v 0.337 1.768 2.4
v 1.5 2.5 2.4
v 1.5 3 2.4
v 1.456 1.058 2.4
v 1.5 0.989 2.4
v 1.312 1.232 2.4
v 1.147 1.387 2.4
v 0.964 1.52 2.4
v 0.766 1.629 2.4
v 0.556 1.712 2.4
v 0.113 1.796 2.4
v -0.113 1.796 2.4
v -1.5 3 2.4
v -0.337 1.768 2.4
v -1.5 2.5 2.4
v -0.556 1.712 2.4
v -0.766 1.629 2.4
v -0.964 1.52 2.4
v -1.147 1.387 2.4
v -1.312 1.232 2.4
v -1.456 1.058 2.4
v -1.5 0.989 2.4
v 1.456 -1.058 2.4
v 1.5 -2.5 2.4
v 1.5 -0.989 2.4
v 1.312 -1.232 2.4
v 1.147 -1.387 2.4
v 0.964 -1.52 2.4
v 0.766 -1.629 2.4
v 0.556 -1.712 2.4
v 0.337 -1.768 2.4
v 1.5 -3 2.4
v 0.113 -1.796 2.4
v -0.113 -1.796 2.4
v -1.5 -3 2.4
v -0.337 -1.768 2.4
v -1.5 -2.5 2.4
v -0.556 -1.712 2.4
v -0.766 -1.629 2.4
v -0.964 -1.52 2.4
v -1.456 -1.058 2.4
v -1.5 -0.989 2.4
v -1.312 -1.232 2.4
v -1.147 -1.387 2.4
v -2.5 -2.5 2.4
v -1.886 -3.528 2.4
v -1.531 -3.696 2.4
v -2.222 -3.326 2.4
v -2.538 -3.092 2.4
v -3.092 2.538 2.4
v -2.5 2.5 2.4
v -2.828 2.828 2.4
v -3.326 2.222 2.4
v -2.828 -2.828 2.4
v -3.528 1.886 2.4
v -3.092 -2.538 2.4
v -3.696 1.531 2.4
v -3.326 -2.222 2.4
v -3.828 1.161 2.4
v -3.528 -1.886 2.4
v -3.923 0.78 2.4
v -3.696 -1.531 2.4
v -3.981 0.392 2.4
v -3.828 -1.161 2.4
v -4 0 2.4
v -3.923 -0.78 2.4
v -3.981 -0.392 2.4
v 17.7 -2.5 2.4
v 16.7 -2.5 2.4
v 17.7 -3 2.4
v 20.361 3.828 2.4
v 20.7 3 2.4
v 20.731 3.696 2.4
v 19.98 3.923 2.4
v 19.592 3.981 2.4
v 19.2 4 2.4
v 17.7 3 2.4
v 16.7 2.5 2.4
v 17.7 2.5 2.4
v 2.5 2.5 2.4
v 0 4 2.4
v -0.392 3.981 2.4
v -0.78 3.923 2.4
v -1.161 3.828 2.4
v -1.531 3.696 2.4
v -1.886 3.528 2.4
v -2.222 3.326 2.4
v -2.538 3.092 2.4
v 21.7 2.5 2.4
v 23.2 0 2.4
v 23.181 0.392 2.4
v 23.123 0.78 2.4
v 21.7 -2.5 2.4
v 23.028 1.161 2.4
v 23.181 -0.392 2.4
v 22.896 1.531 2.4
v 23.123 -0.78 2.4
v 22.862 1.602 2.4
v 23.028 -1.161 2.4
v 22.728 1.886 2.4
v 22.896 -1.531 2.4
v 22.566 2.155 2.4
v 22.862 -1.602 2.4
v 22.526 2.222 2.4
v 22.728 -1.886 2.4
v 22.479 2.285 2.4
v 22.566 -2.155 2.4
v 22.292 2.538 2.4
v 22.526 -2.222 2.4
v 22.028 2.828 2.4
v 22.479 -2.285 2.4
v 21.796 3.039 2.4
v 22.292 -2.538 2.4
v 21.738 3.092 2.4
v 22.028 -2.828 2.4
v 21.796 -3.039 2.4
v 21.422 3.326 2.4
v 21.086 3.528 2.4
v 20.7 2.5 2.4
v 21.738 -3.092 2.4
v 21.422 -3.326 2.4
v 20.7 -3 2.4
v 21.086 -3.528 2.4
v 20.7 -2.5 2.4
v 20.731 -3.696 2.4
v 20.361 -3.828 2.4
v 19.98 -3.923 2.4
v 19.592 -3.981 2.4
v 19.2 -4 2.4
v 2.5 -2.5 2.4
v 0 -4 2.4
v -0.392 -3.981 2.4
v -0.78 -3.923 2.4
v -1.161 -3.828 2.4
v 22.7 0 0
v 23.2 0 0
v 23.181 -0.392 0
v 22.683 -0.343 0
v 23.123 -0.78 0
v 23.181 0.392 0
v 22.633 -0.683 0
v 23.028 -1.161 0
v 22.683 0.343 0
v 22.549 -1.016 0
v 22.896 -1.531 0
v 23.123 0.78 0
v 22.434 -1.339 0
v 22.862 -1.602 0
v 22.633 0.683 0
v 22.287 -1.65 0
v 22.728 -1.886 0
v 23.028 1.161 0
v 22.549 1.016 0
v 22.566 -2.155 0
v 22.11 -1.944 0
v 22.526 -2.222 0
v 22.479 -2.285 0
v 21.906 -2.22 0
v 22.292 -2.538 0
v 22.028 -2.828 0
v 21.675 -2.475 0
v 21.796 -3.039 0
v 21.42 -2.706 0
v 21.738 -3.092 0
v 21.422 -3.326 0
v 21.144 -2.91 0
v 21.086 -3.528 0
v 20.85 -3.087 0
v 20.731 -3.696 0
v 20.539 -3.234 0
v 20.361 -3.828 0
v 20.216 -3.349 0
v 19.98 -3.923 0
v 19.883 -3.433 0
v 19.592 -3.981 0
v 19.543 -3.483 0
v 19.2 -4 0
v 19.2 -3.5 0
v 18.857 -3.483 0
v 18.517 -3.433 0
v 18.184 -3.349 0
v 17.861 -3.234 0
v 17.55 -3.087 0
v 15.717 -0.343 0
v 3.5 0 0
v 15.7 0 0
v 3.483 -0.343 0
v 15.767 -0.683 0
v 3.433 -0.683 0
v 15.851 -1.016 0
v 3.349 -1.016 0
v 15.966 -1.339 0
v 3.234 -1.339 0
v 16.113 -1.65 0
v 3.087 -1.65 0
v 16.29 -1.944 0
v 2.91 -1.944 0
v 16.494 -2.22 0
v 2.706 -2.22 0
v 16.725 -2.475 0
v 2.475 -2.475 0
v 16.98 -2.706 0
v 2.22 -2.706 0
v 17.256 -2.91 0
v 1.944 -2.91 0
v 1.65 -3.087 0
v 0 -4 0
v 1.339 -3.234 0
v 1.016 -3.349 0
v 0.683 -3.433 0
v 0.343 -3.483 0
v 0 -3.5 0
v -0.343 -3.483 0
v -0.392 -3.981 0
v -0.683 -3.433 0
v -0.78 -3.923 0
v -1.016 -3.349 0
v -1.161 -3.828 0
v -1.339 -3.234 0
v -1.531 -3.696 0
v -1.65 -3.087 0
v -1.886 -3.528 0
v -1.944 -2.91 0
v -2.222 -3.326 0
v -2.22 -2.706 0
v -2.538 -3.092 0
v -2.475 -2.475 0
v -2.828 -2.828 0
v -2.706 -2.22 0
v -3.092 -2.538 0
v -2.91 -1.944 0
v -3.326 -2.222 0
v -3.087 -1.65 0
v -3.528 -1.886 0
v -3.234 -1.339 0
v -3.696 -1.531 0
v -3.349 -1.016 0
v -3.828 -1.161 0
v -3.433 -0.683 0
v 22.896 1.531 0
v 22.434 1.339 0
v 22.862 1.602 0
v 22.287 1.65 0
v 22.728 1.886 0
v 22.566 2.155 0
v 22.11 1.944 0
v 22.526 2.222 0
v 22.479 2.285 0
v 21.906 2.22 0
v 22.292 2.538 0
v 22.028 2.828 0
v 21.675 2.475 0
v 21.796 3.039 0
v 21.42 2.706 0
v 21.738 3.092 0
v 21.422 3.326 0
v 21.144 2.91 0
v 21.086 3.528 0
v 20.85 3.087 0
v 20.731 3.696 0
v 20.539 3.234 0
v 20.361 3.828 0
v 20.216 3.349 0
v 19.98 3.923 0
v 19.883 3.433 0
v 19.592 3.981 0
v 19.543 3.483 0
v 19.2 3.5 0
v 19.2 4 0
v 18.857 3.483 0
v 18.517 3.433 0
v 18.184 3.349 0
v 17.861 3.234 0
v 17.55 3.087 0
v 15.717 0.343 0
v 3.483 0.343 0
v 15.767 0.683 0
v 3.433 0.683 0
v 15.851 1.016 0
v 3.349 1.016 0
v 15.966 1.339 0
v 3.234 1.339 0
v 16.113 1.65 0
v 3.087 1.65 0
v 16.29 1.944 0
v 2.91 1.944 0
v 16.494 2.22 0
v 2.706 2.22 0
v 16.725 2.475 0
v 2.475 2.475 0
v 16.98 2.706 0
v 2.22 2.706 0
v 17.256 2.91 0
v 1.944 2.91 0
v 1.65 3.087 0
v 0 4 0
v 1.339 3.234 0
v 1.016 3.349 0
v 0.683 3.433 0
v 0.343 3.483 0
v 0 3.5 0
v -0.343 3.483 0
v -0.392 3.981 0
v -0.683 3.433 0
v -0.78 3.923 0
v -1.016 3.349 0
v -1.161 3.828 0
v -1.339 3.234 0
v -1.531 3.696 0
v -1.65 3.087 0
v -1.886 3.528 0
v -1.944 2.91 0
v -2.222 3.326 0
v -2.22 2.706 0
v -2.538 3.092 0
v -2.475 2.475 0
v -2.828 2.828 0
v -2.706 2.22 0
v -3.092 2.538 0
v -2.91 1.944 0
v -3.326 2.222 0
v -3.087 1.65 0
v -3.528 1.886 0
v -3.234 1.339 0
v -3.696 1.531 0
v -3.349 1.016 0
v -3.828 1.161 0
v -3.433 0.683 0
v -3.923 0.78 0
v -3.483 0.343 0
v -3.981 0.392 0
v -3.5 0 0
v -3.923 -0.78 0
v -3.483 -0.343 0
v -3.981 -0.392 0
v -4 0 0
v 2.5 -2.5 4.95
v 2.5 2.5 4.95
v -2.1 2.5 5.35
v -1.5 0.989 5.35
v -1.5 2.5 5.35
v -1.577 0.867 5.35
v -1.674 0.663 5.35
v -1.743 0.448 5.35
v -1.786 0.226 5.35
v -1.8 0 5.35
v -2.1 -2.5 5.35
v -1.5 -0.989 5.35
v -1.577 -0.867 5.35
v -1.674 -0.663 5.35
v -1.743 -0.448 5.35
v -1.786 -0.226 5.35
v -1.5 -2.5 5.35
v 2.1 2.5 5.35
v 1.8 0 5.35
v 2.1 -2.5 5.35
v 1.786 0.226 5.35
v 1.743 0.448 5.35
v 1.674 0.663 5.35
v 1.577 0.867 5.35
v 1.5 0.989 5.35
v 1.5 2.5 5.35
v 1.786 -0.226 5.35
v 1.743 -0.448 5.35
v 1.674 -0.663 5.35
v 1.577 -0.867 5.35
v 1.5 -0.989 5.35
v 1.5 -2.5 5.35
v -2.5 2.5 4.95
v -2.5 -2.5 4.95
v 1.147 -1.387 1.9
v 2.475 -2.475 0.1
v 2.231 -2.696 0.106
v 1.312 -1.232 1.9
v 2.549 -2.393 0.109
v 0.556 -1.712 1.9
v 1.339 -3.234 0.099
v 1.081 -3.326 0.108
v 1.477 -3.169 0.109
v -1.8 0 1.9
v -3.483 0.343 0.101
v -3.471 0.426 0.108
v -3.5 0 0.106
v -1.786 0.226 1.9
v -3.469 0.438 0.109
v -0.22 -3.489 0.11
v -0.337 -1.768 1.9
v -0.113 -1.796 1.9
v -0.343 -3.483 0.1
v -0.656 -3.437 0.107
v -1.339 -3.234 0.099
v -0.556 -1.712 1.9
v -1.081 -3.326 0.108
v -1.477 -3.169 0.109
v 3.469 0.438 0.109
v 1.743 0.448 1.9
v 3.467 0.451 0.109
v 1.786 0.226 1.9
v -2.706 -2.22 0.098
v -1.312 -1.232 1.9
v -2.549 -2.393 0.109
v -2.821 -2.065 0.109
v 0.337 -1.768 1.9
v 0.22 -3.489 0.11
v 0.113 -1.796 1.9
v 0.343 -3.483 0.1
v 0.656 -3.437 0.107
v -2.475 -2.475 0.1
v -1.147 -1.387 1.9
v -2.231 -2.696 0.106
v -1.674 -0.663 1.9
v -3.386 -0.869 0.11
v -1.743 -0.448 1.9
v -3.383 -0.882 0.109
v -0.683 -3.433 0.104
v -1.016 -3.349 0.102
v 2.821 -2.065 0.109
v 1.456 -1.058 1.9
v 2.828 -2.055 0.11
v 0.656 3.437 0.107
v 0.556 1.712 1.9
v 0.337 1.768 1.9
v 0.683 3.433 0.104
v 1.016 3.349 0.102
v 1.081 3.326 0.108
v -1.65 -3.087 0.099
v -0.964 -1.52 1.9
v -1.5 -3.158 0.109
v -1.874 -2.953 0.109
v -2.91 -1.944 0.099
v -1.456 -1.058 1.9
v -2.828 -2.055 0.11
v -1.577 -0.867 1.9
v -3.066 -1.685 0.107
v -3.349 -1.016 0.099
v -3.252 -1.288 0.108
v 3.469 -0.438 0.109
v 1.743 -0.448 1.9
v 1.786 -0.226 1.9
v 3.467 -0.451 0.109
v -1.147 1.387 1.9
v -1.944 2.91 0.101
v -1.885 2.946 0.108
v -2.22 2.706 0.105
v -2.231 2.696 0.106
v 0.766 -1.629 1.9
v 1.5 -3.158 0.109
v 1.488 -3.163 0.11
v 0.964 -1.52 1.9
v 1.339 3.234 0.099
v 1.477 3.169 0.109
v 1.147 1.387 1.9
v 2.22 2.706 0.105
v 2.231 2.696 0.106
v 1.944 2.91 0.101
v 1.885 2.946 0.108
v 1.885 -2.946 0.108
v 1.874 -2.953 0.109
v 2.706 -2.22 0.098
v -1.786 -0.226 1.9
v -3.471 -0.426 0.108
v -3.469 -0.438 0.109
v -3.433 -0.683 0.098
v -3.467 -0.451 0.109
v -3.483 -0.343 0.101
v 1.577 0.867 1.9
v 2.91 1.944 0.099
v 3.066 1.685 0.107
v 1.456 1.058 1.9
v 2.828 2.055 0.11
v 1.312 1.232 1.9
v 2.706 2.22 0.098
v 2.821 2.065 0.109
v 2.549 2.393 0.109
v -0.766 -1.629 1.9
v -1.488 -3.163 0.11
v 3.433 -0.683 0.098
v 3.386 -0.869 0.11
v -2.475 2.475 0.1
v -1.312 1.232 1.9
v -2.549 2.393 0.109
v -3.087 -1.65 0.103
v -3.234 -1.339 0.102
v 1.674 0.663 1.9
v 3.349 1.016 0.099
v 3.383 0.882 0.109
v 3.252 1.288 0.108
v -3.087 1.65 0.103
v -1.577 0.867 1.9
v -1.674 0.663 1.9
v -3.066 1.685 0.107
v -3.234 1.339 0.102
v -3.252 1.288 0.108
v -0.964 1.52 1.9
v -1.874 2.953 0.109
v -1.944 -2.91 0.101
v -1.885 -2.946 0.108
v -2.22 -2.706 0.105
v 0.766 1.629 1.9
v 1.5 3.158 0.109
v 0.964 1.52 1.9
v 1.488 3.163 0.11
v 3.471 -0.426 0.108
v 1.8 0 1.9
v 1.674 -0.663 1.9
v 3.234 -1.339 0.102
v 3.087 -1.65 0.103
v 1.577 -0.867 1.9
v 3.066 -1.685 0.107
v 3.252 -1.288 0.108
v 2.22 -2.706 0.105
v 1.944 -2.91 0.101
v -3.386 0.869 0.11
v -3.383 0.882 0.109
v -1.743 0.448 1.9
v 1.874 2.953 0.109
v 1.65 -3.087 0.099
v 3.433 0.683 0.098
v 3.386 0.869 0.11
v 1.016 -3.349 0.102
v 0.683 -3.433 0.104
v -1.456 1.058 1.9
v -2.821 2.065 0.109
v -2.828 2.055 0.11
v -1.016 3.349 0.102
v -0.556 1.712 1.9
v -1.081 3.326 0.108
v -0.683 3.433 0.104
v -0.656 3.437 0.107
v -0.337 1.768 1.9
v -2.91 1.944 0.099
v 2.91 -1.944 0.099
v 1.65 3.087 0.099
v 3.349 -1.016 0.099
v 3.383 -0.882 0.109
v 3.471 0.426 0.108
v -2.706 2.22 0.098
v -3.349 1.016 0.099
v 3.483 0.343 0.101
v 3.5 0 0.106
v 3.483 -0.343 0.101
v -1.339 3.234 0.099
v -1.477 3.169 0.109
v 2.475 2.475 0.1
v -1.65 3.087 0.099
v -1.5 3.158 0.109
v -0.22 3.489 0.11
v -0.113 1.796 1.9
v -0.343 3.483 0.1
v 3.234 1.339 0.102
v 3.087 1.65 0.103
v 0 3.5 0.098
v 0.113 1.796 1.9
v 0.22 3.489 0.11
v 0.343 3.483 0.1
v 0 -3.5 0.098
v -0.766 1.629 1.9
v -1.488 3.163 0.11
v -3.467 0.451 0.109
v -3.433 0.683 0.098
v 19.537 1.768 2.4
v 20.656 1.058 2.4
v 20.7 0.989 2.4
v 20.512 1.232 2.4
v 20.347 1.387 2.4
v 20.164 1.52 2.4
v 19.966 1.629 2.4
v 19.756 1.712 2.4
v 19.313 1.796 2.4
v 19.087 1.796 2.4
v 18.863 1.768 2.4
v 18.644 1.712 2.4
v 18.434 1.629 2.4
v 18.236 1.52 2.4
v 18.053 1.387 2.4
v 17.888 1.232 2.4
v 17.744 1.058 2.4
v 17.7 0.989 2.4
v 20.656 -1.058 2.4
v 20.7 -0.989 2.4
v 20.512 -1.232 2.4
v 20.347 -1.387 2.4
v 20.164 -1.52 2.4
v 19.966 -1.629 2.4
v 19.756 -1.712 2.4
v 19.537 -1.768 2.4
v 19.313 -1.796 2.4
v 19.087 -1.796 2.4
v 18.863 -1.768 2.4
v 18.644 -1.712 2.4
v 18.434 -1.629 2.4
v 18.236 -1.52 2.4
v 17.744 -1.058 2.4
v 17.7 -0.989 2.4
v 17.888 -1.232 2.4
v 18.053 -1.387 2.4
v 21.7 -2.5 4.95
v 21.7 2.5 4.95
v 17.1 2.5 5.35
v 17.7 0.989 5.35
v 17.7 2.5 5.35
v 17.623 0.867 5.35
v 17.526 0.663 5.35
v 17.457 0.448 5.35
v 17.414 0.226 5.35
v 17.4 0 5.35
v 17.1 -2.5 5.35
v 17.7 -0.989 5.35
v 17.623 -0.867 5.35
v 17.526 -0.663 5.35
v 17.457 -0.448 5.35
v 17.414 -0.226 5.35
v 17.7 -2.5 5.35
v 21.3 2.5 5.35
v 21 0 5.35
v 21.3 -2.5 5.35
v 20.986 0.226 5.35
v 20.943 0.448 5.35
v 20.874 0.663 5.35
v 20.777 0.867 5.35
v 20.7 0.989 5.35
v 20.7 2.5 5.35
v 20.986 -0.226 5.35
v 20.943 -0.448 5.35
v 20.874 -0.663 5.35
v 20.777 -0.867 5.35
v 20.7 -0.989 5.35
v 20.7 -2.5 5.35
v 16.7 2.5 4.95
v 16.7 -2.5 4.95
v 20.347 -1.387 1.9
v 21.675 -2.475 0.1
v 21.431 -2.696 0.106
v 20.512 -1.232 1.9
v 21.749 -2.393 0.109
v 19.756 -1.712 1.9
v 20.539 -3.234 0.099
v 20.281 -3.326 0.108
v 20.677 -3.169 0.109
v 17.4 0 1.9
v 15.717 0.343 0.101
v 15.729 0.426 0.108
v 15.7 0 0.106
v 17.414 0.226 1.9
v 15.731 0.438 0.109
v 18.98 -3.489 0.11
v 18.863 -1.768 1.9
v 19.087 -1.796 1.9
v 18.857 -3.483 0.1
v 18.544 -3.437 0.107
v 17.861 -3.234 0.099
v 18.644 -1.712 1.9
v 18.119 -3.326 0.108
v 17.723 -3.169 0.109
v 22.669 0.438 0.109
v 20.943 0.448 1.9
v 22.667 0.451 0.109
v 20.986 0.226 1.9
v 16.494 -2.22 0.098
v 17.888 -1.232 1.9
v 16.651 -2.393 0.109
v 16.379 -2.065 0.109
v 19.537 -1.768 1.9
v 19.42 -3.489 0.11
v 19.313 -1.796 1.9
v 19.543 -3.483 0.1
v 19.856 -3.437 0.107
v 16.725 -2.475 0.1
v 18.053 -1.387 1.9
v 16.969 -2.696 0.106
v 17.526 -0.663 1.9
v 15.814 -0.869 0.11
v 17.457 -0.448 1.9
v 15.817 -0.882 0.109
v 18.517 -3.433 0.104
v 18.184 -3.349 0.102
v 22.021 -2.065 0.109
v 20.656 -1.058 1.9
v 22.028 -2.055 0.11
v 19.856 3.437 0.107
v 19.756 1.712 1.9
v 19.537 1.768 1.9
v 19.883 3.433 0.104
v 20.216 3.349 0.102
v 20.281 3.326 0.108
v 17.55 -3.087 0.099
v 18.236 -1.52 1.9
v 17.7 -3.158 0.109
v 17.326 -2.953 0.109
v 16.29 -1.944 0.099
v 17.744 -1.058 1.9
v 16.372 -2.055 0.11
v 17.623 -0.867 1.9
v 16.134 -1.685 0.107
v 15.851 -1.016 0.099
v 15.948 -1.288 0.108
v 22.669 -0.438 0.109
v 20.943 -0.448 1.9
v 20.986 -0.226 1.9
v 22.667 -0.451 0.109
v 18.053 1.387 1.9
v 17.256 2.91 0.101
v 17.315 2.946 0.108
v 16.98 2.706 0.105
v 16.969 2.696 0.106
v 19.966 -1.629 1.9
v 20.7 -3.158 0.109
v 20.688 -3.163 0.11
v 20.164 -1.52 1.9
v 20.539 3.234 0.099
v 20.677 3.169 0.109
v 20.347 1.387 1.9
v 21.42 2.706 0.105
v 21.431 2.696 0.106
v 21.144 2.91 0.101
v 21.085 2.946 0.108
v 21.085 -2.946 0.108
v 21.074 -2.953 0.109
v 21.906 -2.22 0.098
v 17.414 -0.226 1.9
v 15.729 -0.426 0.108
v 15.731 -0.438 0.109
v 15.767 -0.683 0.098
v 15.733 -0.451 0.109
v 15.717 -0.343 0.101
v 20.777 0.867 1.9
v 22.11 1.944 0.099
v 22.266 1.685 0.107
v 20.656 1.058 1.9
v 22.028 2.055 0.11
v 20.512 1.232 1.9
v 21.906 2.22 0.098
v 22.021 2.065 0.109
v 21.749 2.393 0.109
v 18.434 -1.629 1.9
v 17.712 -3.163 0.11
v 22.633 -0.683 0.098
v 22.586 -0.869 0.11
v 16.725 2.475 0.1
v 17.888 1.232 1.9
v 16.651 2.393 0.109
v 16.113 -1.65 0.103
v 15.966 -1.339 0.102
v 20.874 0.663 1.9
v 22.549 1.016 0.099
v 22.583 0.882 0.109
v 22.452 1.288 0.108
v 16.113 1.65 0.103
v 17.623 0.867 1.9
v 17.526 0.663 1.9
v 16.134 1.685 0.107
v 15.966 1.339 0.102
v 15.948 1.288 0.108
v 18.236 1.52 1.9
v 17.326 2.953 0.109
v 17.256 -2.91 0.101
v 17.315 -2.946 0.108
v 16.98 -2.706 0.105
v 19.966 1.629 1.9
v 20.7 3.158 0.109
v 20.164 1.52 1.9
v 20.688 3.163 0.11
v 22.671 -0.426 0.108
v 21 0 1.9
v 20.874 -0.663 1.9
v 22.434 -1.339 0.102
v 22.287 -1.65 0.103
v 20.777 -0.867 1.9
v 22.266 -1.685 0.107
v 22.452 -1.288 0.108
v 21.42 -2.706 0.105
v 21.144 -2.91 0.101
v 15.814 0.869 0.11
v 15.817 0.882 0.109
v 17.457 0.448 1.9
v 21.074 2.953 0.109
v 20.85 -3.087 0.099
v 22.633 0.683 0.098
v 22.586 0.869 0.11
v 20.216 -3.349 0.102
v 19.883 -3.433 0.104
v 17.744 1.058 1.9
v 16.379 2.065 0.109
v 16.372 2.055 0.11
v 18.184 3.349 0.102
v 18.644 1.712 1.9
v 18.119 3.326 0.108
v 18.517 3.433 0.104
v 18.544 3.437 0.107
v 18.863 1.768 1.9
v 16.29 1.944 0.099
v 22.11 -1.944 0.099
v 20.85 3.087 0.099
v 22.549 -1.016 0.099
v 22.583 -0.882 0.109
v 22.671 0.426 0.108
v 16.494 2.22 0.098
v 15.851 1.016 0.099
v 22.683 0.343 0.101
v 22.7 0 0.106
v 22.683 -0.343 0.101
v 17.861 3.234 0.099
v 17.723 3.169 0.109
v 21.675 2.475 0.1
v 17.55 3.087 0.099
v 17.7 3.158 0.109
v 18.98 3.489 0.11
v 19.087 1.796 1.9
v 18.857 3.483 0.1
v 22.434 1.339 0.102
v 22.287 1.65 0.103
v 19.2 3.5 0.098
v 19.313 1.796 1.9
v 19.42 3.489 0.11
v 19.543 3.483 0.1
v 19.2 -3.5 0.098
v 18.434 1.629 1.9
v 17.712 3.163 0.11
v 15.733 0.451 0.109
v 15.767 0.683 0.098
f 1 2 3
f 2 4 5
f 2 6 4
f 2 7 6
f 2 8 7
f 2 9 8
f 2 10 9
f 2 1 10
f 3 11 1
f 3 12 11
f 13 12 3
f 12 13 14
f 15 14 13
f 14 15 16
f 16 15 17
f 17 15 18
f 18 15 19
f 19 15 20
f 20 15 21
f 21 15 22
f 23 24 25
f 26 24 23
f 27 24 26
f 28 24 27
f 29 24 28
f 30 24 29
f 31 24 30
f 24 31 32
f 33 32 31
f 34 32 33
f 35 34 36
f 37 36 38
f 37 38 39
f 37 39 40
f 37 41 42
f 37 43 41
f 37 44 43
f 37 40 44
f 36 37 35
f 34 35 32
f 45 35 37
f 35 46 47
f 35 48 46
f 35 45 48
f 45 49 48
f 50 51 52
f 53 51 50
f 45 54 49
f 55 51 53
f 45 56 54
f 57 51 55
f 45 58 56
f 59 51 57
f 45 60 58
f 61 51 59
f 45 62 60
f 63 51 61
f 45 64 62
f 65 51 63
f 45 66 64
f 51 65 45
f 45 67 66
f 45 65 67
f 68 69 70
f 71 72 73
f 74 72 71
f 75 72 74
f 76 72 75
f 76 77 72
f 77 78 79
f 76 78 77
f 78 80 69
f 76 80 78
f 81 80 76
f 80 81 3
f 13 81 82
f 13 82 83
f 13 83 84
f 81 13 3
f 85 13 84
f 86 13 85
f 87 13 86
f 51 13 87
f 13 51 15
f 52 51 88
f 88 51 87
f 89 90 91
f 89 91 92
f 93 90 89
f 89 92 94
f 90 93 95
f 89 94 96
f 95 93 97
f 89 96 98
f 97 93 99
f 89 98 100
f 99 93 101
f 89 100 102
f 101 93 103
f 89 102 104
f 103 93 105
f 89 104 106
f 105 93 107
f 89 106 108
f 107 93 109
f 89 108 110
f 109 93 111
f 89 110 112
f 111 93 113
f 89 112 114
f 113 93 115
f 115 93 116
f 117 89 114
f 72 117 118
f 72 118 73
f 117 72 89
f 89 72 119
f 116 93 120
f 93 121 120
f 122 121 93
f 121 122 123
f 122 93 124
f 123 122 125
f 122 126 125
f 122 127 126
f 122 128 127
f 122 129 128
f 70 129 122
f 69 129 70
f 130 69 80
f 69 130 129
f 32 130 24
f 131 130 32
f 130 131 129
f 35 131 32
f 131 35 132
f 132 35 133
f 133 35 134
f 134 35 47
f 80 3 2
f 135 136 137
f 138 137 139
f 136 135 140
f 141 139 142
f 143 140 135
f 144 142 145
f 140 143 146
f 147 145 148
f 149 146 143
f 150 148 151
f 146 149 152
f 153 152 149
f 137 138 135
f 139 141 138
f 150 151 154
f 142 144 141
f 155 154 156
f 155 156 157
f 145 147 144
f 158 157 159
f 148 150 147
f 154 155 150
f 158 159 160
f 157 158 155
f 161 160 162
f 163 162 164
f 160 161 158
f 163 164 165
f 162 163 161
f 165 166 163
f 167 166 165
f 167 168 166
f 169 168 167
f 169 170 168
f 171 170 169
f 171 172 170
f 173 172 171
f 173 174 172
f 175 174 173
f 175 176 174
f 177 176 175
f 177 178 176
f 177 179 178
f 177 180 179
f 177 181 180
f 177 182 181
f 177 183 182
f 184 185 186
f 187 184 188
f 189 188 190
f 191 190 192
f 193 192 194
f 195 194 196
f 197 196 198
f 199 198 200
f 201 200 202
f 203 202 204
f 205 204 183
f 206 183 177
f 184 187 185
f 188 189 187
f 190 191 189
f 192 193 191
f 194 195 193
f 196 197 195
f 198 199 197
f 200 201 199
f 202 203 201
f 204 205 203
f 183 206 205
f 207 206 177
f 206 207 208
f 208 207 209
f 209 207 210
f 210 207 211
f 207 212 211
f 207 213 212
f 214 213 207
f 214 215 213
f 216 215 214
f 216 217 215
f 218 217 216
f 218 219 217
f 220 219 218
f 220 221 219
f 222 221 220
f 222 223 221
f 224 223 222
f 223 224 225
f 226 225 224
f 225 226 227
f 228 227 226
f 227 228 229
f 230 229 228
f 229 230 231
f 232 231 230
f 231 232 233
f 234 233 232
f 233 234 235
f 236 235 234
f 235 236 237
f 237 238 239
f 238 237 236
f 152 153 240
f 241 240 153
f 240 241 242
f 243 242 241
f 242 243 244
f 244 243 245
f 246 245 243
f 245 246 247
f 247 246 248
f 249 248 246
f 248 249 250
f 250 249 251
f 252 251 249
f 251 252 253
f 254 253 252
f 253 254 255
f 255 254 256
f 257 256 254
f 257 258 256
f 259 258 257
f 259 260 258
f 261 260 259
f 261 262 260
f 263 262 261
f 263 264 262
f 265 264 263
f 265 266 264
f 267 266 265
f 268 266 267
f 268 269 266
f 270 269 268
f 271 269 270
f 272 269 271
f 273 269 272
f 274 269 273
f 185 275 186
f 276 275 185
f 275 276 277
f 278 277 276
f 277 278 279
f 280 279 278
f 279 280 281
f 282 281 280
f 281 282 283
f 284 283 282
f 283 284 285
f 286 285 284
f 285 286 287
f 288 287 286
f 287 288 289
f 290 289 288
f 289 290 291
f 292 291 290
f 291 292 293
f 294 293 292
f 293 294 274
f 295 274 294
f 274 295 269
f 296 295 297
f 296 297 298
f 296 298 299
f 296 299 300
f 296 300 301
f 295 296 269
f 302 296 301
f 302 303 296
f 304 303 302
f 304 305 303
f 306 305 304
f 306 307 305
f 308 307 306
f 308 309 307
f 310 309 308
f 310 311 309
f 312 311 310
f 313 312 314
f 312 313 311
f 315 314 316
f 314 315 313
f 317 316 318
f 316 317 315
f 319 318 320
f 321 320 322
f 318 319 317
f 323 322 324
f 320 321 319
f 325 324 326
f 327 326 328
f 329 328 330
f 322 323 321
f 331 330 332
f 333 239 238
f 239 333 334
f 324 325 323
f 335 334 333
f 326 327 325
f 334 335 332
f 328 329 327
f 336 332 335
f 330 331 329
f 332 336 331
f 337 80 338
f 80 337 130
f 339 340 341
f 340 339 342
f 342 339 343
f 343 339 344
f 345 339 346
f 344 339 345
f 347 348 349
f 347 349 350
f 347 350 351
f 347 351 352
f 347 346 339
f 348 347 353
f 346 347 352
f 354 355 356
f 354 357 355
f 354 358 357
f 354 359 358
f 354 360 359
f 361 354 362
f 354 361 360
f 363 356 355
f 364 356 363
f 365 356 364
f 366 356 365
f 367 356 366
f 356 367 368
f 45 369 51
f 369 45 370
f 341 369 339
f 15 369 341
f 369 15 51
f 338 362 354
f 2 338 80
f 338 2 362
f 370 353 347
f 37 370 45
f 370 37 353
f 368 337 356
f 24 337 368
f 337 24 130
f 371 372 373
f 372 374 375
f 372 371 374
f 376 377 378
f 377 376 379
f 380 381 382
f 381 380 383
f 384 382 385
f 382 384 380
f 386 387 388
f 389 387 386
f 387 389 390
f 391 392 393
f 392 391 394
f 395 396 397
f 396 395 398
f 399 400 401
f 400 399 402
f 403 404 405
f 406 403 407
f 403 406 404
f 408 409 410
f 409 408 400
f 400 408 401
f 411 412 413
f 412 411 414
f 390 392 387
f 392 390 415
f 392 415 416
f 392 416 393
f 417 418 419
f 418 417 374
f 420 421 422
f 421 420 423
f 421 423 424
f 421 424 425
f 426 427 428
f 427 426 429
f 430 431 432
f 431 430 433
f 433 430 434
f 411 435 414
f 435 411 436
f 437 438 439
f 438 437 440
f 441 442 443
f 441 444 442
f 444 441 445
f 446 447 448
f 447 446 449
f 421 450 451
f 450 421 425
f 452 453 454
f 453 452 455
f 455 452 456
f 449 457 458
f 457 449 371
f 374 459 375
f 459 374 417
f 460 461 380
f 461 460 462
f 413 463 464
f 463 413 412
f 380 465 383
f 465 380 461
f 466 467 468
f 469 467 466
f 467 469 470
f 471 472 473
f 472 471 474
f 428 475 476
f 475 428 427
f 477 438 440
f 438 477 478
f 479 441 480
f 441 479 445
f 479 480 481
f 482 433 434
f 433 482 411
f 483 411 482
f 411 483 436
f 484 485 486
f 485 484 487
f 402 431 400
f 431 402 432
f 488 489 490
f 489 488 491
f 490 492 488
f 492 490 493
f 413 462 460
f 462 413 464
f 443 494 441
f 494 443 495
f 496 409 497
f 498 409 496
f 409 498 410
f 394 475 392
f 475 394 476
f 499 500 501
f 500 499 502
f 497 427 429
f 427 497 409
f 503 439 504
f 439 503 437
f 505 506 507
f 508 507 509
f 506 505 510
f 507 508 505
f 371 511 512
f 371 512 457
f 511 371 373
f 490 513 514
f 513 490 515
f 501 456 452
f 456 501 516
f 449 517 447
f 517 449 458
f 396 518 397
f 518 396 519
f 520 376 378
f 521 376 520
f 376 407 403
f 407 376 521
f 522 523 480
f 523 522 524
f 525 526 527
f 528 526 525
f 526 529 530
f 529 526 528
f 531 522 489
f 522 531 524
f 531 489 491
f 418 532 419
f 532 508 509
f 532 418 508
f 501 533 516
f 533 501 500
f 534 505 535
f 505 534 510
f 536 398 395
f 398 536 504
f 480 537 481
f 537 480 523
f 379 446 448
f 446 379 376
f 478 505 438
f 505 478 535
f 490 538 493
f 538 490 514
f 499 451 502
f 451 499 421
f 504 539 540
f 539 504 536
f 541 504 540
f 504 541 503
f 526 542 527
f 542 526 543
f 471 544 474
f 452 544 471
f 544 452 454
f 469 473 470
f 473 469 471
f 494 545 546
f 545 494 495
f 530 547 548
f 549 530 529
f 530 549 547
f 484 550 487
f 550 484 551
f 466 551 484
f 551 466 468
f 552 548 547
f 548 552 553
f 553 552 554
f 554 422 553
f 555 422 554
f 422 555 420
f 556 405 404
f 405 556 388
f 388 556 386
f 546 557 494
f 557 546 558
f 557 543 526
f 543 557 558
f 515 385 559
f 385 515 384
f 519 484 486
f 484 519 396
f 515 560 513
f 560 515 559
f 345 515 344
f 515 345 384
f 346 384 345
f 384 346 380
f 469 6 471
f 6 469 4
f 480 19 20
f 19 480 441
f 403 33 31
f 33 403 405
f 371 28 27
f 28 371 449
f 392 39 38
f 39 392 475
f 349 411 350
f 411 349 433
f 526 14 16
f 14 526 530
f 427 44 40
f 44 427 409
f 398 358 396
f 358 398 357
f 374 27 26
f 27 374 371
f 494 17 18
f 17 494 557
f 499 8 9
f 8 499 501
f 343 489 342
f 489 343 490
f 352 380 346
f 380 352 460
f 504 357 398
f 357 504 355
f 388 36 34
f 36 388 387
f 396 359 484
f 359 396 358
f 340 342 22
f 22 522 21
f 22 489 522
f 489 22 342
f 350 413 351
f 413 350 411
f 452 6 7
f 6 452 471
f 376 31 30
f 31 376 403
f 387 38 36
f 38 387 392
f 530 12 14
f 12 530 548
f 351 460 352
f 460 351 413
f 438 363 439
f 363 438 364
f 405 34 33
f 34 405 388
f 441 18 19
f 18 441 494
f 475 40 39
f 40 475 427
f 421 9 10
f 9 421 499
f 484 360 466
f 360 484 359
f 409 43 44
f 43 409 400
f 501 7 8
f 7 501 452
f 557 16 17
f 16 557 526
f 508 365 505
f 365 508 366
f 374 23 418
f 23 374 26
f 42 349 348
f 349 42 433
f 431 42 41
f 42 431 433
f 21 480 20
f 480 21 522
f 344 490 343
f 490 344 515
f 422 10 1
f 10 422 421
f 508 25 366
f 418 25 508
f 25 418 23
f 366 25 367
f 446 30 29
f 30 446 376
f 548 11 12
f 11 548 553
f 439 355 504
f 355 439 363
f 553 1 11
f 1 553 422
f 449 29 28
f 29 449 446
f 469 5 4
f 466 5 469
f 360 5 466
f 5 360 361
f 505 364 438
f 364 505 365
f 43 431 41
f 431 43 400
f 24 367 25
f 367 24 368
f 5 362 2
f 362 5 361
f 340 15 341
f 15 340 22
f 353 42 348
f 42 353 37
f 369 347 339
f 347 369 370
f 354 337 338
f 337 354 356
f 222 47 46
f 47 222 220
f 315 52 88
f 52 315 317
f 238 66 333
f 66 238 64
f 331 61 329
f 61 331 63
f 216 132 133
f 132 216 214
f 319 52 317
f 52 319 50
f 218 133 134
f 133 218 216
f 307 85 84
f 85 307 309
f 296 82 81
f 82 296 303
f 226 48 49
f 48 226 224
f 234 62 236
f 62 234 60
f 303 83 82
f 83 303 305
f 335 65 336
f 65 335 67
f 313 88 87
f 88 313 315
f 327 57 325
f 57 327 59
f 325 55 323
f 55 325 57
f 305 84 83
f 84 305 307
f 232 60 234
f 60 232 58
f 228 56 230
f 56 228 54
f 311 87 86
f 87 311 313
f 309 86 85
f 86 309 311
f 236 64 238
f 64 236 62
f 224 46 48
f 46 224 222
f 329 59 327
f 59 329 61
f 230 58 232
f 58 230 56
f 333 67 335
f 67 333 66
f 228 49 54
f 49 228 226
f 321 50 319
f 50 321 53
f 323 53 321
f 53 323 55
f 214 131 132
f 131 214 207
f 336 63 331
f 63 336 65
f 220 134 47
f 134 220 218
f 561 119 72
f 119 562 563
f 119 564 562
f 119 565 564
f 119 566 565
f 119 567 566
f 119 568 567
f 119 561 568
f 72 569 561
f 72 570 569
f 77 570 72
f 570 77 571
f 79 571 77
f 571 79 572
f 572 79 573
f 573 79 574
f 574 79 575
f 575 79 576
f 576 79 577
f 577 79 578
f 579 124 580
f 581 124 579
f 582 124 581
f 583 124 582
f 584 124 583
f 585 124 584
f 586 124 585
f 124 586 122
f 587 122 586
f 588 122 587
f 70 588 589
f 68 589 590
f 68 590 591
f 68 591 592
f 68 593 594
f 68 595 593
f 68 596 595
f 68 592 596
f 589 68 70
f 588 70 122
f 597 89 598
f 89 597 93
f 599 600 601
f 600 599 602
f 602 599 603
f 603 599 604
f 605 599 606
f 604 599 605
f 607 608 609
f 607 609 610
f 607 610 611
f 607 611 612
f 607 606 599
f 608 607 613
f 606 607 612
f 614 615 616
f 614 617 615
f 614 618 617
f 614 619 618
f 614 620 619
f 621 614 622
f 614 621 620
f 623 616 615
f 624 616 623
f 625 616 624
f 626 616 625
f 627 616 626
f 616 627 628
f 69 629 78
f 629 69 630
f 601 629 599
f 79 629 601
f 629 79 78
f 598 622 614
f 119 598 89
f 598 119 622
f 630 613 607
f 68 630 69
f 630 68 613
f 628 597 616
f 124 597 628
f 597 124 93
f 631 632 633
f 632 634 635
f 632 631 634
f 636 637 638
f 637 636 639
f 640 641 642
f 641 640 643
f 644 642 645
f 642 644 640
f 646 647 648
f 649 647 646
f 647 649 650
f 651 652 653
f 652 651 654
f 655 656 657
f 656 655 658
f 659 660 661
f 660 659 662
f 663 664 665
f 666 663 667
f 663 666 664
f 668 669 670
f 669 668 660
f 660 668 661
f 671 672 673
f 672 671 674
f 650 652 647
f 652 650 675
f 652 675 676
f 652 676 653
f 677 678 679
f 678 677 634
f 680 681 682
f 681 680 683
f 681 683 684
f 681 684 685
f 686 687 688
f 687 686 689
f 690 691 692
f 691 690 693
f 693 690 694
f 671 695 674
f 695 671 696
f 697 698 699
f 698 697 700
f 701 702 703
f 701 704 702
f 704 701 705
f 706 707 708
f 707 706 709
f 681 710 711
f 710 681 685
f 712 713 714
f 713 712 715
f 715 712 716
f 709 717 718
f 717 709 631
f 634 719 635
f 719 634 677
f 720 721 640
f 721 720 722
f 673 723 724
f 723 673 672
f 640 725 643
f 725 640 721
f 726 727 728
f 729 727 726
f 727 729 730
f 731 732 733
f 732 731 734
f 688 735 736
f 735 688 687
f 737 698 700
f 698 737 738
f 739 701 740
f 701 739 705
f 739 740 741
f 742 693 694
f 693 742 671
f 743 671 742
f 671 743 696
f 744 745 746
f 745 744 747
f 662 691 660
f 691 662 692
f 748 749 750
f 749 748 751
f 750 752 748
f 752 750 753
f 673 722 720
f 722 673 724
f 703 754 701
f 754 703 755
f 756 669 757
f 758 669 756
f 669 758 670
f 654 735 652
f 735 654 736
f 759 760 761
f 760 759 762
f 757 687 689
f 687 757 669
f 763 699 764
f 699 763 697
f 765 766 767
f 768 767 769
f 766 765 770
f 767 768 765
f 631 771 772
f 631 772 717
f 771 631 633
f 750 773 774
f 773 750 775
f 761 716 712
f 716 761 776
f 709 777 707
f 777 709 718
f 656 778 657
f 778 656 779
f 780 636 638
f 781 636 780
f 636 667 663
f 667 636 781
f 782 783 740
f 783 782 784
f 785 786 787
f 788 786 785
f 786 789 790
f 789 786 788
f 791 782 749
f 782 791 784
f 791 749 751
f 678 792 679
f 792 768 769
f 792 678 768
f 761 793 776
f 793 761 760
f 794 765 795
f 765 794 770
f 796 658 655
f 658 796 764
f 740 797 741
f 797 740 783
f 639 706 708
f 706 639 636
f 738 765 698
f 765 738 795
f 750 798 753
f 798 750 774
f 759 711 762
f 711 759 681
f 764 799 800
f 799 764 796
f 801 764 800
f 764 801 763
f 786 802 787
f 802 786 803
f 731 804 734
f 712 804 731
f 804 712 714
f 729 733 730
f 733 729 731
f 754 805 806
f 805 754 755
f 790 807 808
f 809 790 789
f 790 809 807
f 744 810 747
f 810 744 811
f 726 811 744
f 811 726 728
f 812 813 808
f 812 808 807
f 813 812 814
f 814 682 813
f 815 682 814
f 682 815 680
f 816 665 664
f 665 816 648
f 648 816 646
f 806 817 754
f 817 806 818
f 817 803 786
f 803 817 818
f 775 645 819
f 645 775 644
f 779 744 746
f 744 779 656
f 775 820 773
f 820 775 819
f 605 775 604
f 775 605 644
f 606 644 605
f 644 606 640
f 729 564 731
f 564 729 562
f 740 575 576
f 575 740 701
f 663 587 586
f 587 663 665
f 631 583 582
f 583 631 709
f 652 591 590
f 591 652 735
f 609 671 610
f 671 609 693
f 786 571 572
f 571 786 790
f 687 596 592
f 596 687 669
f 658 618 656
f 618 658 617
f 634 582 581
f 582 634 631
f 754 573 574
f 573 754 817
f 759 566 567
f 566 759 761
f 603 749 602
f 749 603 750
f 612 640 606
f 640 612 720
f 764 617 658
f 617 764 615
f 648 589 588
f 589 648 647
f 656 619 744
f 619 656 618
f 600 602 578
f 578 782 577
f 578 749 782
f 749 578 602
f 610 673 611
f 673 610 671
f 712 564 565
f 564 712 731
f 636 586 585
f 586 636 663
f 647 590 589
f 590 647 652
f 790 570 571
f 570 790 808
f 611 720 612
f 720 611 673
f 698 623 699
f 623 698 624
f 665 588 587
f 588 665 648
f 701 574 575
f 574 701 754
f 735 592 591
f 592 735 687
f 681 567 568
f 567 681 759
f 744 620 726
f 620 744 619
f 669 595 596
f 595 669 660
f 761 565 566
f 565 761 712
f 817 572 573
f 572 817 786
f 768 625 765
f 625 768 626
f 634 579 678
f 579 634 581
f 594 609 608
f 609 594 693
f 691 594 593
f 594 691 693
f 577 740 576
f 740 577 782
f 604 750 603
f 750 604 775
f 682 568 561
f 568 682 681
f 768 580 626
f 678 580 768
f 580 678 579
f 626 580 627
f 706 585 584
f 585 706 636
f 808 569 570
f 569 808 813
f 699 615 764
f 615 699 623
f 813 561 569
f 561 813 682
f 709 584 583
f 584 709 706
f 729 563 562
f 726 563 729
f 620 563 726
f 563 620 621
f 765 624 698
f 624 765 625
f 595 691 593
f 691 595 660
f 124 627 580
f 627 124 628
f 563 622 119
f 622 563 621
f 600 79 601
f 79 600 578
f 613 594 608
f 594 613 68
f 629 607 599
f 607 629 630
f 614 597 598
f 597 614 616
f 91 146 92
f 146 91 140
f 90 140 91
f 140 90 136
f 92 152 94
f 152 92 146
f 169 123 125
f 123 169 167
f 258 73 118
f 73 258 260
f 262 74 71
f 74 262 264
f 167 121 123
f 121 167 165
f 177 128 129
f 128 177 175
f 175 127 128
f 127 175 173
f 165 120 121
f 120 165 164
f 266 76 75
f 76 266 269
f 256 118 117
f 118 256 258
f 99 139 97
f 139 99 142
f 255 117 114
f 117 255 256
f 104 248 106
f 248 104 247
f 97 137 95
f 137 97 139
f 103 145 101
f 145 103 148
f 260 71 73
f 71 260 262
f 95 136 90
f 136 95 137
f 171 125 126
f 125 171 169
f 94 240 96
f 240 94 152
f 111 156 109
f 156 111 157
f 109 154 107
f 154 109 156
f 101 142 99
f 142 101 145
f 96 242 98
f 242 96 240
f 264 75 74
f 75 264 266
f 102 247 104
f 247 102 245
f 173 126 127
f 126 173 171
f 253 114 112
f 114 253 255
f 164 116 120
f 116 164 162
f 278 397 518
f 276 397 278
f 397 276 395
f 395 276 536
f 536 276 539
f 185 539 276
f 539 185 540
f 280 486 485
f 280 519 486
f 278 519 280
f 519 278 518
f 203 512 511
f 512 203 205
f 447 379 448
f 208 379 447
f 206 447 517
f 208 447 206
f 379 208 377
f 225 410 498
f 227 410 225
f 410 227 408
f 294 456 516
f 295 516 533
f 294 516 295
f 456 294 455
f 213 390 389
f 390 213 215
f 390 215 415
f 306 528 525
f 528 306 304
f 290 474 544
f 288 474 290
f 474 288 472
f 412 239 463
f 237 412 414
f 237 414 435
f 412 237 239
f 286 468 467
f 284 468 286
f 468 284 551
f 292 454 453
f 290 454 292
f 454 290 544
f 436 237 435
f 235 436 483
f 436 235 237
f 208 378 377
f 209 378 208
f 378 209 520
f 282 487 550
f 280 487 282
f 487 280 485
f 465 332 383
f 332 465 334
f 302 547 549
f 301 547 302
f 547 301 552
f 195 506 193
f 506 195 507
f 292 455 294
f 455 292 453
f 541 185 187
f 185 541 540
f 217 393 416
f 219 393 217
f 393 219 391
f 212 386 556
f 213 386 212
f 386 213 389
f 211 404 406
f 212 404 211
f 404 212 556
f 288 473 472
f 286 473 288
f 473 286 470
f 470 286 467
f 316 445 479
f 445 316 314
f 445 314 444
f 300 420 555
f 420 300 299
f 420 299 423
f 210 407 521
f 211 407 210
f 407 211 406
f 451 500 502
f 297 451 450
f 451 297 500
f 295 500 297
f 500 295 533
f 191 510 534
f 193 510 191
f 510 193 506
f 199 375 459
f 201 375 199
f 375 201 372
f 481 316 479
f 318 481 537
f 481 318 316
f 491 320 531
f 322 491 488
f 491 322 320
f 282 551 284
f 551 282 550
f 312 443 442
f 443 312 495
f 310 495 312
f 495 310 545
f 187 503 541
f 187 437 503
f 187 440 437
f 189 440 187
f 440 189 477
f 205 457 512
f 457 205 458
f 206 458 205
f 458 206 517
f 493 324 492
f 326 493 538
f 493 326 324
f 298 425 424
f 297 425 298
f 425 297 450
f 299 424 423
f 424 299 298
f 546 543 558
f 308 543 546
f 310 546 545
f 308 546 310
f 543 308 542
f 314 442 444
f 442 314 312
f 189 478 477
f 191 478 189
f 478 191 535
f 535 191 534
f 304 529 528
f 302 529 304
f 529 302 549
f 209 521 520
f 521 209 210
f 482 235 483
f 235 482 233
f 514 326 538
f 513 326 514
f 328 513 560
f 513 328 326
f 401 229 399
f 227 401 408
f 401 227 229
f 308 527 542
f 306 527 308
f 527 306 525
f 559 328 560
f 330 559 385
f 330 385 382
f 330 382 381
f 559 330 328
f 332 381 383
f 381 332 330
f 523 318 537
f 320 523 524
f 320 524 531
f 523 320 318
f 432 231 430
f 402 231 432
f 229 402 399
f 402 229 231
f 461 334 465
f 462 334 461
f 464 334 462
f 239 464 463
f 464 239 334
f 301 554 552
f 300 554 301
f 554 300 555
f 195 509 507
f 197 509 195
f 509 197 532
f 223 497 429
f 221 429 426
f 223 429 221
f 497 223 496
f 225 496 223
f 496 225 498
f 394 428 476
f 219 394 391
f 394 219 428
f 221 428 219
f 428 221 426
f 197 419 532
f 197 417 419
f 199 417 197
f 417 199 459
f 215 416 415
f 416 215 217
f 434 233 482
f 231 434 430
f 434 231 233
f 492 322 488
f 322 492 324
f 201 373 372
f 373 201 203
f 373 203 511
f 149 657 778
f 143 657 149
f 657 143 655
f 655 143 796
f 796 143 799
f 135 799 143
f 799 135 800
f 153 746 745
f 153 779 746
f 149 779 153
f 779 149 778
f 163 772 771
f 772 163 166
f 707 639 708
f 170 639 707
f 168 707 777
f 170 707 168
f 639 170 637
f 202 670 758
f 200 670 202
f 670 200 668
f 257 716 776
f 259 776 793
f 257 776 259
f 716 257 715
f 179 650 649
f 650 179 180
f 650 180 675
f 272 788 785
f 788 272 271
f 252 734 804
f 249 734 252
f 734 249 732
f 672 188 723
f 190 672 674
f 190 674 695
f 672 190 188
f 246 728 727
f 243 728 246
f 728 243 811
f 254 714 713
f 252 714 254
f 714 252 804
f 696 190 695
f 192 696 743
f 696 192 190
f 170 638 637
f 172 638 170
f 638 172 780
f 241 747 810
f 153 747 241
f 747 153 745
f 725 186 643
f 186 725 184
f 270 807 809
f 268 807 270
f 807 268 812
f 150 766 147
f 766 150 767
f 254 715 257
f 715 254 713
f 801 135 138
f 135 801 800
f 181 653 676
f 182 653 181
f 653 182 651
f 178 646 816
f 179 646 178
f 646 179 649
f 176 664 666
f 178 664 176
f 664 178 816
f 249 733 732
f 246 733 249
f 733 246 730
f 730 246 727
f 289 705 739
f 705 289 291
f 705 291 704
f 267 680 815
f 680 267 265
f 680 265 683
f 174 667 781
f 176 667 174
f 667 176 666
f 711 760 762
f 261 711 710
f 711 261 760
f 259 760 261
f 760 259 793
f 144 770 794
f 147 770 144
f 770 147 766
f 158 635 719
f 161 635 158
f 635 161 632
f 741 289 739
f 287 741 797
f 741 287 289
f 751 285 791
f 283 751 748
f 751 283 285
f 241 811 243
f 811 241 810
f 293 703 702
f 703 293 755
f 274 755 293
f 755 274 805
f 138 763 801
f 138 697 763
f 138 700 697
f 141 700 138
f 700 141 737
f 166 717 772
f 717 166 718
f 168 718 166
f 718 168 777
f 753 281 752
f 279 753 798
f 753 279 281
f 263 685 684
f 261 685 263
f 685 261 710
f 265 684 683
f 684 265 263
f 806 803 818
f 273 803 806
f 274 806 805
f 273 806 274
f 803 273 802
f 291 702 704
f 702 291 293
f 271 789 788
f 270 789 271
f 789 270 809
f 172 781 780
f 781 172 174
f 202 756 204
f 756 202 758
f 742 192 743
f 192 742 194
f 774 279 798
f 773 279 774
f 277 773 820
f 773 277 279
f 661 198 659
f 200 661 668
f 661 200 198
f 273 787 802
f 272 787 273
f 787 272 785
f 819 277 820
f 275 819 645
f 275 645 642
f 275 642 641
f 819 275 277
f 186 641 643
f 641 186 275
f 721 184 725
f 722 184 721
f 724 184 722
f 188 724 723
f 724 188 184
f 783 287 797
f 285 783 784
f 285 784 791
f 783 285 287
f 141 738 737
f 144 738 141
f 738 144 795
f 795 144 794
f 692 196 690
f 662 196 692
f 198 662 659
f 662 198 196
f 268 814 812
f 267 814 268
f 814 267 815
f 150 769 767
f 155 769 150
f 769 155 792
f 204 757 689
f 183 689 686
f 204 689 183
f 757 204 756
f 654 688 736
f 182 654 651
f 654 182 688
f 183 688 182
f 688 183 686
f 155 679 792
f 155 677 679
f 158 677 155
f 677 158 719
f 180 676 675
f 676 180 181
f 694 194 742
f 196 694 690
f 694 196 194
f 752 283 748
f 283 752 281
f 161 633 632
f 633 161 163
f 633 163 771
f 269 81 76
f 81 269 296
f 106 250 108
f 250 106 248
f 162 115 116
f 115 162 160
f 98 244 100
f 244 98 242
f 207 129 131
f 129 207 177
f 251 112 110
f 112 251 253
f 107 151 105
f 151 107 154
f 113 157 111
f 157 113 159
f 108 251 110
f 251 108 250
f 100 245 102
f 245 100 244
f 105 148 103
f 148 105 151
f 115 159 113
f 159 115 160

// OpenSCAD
// file: native_adapter.scad
$fn = 50;

difference() {
	union() {
		translate(v = [0, 0, 0]) {
			rotate(a = [0, 0, 0]) {
				difference() {
					union() {
						translate(v = [0, 0, 0]) {
							rotate(a = [0, 0, 0]) {
								difference() {
									union() {
										translate(v = [-0.35, 0, 0]) {
											hull() {
												translate(v = [-4.4, 4.25, 0]) {
													cylinder(h = 2.4, r = 0.75);
												}
												translate(v = [4.4, 4.25, 0]) {
													cylinder(h = 2.4, r = 0.75);
												}
												translate(v = [-4.4, -4.25, 0]) {
													cylinder(h = 2.4, r = 0.75);
												}
												translate(v = [4.4, -4.25, 0]) {
													cylinder(h = 2.4, r = 0.75);
												}
											}
										}
										translate(v = [-2.5, -2.5, 2.35]) {
											cube(size = [5.0, 5.0, 3.0]);
										}
									}
									union() {
										translate(v = [0, 0, 0]) {
											rotate(a = [0, 180, 0]) {
												difference() {
													union() {
														translate(v = [0, 0, -20.0]) {
															cylinder(h = 20.0, r = 1.5);
														}
														translate(v = [0, 0, -1.9]) {
															cylinder(h = 1.9, r1 = 1.8, r2 = 3.6);
														}
														cylinder(h = 250, r = 3.6);
														translate(v = [0, 0, -20.0]) {
															cylinder(h = 20.0, r = 1.8);
														}
														translate(v = [0, 0, -20.0]) {
															cylinder(h = 20.0, r = 1.5);
														}
													}
													union();
												}
											}
										}
										translate(v = [-1.5, -3.0, 2.4]) {
											cube(size = [3.0, 6.0, 3.0500000000000003]);
										}
										translate(v = [0, 2.6, 0]) {
											rotate(a = [90, 0, 0]) {
												linear_extrude(height = 5.2) {
													polygon(points = [[-2.7, 4.75], [-1.9, 5.55], [-2.7, 5.55]]);
												}
											}
										}
										translate(v = [0, 2.6, 0]) {
											rotate(a = [90, 0, 0]) {
												linear_extrude(height = 5.2) {
													polygon(points = [[2.7, 4.75], [1.9, 5.55], [2.7, 5.55]]);
												}
											}
										}
										translate(v = [-4.6, -5.5, -0.1]) {
											cylinder(h = 2.6, r = 3.15);
										}
										translate(v = [-4.6, 5.5, -0.1]) {
											cylinder(h = 2.6, r = 3.15);
										}
										translate(v = [4.6, -5.5, -0.1]) {
											cylinder(h = 2.6, r = 3.15);
										}
										translate(v = [4.6, 5.5, -0.1]) {
											cylinder(h = 2.6, r = 3.15);
										}
									}
								}
							}
						}
					}
					union();
				}
			}
		}
	}
	union();
}
// file: beam_joint_geometry.scad
$fn=64;
tie_t=2.4;
module native_adapter(){
include <native_adapter.scad>
}

module joint_bores(holes,wood) {
  // Leave the OOBB countersink and pilot cheeks of each native adapter intact.
  for(p=holes) translate([p[0],p[1],-.05]) cylinder(d=7,h=tie_t+.1);
  if(len(wood)) translate(wood) {
    translate([0,0,-.05]) cylinder(d=4,h=tie_t+.1);
    translate([0,0,-.01]) cylinder(d1=7.02,d2=4,h=1.51);
  }
}

module foot(p,r) { translate(p) circle(r=r); }
module strap(a,b,ra,rb) { hull(){ foot(a,ra); foot(b,rb); } }
module beam_joint(holes,spine=[],wood=[]) {
  union(){
    for(p=holes) translate(p) intersection(){
      native_adapter();
      cylinder(r=4,h=12);
    }
    difference(){
      linear_extrude(tie_t) union(){
        if(len(wood)) strap(holes[0],wood,4,4.6);
        else if(len(spine)==0) strap(holes[0],holes[1],4,4);
        else {
          strap(spine[0],spine[1],2.65,2.65);
          for(p=holes) strap(p,[spine[0][0],p[1]],4,2.65);
        }
      }
      joint_bores(holes,wood);
    }
  }
}
// main file
include <beam_joint_geometry.scad>
beam_joint([[0, 0], [19.2, 0]],[],[]);
